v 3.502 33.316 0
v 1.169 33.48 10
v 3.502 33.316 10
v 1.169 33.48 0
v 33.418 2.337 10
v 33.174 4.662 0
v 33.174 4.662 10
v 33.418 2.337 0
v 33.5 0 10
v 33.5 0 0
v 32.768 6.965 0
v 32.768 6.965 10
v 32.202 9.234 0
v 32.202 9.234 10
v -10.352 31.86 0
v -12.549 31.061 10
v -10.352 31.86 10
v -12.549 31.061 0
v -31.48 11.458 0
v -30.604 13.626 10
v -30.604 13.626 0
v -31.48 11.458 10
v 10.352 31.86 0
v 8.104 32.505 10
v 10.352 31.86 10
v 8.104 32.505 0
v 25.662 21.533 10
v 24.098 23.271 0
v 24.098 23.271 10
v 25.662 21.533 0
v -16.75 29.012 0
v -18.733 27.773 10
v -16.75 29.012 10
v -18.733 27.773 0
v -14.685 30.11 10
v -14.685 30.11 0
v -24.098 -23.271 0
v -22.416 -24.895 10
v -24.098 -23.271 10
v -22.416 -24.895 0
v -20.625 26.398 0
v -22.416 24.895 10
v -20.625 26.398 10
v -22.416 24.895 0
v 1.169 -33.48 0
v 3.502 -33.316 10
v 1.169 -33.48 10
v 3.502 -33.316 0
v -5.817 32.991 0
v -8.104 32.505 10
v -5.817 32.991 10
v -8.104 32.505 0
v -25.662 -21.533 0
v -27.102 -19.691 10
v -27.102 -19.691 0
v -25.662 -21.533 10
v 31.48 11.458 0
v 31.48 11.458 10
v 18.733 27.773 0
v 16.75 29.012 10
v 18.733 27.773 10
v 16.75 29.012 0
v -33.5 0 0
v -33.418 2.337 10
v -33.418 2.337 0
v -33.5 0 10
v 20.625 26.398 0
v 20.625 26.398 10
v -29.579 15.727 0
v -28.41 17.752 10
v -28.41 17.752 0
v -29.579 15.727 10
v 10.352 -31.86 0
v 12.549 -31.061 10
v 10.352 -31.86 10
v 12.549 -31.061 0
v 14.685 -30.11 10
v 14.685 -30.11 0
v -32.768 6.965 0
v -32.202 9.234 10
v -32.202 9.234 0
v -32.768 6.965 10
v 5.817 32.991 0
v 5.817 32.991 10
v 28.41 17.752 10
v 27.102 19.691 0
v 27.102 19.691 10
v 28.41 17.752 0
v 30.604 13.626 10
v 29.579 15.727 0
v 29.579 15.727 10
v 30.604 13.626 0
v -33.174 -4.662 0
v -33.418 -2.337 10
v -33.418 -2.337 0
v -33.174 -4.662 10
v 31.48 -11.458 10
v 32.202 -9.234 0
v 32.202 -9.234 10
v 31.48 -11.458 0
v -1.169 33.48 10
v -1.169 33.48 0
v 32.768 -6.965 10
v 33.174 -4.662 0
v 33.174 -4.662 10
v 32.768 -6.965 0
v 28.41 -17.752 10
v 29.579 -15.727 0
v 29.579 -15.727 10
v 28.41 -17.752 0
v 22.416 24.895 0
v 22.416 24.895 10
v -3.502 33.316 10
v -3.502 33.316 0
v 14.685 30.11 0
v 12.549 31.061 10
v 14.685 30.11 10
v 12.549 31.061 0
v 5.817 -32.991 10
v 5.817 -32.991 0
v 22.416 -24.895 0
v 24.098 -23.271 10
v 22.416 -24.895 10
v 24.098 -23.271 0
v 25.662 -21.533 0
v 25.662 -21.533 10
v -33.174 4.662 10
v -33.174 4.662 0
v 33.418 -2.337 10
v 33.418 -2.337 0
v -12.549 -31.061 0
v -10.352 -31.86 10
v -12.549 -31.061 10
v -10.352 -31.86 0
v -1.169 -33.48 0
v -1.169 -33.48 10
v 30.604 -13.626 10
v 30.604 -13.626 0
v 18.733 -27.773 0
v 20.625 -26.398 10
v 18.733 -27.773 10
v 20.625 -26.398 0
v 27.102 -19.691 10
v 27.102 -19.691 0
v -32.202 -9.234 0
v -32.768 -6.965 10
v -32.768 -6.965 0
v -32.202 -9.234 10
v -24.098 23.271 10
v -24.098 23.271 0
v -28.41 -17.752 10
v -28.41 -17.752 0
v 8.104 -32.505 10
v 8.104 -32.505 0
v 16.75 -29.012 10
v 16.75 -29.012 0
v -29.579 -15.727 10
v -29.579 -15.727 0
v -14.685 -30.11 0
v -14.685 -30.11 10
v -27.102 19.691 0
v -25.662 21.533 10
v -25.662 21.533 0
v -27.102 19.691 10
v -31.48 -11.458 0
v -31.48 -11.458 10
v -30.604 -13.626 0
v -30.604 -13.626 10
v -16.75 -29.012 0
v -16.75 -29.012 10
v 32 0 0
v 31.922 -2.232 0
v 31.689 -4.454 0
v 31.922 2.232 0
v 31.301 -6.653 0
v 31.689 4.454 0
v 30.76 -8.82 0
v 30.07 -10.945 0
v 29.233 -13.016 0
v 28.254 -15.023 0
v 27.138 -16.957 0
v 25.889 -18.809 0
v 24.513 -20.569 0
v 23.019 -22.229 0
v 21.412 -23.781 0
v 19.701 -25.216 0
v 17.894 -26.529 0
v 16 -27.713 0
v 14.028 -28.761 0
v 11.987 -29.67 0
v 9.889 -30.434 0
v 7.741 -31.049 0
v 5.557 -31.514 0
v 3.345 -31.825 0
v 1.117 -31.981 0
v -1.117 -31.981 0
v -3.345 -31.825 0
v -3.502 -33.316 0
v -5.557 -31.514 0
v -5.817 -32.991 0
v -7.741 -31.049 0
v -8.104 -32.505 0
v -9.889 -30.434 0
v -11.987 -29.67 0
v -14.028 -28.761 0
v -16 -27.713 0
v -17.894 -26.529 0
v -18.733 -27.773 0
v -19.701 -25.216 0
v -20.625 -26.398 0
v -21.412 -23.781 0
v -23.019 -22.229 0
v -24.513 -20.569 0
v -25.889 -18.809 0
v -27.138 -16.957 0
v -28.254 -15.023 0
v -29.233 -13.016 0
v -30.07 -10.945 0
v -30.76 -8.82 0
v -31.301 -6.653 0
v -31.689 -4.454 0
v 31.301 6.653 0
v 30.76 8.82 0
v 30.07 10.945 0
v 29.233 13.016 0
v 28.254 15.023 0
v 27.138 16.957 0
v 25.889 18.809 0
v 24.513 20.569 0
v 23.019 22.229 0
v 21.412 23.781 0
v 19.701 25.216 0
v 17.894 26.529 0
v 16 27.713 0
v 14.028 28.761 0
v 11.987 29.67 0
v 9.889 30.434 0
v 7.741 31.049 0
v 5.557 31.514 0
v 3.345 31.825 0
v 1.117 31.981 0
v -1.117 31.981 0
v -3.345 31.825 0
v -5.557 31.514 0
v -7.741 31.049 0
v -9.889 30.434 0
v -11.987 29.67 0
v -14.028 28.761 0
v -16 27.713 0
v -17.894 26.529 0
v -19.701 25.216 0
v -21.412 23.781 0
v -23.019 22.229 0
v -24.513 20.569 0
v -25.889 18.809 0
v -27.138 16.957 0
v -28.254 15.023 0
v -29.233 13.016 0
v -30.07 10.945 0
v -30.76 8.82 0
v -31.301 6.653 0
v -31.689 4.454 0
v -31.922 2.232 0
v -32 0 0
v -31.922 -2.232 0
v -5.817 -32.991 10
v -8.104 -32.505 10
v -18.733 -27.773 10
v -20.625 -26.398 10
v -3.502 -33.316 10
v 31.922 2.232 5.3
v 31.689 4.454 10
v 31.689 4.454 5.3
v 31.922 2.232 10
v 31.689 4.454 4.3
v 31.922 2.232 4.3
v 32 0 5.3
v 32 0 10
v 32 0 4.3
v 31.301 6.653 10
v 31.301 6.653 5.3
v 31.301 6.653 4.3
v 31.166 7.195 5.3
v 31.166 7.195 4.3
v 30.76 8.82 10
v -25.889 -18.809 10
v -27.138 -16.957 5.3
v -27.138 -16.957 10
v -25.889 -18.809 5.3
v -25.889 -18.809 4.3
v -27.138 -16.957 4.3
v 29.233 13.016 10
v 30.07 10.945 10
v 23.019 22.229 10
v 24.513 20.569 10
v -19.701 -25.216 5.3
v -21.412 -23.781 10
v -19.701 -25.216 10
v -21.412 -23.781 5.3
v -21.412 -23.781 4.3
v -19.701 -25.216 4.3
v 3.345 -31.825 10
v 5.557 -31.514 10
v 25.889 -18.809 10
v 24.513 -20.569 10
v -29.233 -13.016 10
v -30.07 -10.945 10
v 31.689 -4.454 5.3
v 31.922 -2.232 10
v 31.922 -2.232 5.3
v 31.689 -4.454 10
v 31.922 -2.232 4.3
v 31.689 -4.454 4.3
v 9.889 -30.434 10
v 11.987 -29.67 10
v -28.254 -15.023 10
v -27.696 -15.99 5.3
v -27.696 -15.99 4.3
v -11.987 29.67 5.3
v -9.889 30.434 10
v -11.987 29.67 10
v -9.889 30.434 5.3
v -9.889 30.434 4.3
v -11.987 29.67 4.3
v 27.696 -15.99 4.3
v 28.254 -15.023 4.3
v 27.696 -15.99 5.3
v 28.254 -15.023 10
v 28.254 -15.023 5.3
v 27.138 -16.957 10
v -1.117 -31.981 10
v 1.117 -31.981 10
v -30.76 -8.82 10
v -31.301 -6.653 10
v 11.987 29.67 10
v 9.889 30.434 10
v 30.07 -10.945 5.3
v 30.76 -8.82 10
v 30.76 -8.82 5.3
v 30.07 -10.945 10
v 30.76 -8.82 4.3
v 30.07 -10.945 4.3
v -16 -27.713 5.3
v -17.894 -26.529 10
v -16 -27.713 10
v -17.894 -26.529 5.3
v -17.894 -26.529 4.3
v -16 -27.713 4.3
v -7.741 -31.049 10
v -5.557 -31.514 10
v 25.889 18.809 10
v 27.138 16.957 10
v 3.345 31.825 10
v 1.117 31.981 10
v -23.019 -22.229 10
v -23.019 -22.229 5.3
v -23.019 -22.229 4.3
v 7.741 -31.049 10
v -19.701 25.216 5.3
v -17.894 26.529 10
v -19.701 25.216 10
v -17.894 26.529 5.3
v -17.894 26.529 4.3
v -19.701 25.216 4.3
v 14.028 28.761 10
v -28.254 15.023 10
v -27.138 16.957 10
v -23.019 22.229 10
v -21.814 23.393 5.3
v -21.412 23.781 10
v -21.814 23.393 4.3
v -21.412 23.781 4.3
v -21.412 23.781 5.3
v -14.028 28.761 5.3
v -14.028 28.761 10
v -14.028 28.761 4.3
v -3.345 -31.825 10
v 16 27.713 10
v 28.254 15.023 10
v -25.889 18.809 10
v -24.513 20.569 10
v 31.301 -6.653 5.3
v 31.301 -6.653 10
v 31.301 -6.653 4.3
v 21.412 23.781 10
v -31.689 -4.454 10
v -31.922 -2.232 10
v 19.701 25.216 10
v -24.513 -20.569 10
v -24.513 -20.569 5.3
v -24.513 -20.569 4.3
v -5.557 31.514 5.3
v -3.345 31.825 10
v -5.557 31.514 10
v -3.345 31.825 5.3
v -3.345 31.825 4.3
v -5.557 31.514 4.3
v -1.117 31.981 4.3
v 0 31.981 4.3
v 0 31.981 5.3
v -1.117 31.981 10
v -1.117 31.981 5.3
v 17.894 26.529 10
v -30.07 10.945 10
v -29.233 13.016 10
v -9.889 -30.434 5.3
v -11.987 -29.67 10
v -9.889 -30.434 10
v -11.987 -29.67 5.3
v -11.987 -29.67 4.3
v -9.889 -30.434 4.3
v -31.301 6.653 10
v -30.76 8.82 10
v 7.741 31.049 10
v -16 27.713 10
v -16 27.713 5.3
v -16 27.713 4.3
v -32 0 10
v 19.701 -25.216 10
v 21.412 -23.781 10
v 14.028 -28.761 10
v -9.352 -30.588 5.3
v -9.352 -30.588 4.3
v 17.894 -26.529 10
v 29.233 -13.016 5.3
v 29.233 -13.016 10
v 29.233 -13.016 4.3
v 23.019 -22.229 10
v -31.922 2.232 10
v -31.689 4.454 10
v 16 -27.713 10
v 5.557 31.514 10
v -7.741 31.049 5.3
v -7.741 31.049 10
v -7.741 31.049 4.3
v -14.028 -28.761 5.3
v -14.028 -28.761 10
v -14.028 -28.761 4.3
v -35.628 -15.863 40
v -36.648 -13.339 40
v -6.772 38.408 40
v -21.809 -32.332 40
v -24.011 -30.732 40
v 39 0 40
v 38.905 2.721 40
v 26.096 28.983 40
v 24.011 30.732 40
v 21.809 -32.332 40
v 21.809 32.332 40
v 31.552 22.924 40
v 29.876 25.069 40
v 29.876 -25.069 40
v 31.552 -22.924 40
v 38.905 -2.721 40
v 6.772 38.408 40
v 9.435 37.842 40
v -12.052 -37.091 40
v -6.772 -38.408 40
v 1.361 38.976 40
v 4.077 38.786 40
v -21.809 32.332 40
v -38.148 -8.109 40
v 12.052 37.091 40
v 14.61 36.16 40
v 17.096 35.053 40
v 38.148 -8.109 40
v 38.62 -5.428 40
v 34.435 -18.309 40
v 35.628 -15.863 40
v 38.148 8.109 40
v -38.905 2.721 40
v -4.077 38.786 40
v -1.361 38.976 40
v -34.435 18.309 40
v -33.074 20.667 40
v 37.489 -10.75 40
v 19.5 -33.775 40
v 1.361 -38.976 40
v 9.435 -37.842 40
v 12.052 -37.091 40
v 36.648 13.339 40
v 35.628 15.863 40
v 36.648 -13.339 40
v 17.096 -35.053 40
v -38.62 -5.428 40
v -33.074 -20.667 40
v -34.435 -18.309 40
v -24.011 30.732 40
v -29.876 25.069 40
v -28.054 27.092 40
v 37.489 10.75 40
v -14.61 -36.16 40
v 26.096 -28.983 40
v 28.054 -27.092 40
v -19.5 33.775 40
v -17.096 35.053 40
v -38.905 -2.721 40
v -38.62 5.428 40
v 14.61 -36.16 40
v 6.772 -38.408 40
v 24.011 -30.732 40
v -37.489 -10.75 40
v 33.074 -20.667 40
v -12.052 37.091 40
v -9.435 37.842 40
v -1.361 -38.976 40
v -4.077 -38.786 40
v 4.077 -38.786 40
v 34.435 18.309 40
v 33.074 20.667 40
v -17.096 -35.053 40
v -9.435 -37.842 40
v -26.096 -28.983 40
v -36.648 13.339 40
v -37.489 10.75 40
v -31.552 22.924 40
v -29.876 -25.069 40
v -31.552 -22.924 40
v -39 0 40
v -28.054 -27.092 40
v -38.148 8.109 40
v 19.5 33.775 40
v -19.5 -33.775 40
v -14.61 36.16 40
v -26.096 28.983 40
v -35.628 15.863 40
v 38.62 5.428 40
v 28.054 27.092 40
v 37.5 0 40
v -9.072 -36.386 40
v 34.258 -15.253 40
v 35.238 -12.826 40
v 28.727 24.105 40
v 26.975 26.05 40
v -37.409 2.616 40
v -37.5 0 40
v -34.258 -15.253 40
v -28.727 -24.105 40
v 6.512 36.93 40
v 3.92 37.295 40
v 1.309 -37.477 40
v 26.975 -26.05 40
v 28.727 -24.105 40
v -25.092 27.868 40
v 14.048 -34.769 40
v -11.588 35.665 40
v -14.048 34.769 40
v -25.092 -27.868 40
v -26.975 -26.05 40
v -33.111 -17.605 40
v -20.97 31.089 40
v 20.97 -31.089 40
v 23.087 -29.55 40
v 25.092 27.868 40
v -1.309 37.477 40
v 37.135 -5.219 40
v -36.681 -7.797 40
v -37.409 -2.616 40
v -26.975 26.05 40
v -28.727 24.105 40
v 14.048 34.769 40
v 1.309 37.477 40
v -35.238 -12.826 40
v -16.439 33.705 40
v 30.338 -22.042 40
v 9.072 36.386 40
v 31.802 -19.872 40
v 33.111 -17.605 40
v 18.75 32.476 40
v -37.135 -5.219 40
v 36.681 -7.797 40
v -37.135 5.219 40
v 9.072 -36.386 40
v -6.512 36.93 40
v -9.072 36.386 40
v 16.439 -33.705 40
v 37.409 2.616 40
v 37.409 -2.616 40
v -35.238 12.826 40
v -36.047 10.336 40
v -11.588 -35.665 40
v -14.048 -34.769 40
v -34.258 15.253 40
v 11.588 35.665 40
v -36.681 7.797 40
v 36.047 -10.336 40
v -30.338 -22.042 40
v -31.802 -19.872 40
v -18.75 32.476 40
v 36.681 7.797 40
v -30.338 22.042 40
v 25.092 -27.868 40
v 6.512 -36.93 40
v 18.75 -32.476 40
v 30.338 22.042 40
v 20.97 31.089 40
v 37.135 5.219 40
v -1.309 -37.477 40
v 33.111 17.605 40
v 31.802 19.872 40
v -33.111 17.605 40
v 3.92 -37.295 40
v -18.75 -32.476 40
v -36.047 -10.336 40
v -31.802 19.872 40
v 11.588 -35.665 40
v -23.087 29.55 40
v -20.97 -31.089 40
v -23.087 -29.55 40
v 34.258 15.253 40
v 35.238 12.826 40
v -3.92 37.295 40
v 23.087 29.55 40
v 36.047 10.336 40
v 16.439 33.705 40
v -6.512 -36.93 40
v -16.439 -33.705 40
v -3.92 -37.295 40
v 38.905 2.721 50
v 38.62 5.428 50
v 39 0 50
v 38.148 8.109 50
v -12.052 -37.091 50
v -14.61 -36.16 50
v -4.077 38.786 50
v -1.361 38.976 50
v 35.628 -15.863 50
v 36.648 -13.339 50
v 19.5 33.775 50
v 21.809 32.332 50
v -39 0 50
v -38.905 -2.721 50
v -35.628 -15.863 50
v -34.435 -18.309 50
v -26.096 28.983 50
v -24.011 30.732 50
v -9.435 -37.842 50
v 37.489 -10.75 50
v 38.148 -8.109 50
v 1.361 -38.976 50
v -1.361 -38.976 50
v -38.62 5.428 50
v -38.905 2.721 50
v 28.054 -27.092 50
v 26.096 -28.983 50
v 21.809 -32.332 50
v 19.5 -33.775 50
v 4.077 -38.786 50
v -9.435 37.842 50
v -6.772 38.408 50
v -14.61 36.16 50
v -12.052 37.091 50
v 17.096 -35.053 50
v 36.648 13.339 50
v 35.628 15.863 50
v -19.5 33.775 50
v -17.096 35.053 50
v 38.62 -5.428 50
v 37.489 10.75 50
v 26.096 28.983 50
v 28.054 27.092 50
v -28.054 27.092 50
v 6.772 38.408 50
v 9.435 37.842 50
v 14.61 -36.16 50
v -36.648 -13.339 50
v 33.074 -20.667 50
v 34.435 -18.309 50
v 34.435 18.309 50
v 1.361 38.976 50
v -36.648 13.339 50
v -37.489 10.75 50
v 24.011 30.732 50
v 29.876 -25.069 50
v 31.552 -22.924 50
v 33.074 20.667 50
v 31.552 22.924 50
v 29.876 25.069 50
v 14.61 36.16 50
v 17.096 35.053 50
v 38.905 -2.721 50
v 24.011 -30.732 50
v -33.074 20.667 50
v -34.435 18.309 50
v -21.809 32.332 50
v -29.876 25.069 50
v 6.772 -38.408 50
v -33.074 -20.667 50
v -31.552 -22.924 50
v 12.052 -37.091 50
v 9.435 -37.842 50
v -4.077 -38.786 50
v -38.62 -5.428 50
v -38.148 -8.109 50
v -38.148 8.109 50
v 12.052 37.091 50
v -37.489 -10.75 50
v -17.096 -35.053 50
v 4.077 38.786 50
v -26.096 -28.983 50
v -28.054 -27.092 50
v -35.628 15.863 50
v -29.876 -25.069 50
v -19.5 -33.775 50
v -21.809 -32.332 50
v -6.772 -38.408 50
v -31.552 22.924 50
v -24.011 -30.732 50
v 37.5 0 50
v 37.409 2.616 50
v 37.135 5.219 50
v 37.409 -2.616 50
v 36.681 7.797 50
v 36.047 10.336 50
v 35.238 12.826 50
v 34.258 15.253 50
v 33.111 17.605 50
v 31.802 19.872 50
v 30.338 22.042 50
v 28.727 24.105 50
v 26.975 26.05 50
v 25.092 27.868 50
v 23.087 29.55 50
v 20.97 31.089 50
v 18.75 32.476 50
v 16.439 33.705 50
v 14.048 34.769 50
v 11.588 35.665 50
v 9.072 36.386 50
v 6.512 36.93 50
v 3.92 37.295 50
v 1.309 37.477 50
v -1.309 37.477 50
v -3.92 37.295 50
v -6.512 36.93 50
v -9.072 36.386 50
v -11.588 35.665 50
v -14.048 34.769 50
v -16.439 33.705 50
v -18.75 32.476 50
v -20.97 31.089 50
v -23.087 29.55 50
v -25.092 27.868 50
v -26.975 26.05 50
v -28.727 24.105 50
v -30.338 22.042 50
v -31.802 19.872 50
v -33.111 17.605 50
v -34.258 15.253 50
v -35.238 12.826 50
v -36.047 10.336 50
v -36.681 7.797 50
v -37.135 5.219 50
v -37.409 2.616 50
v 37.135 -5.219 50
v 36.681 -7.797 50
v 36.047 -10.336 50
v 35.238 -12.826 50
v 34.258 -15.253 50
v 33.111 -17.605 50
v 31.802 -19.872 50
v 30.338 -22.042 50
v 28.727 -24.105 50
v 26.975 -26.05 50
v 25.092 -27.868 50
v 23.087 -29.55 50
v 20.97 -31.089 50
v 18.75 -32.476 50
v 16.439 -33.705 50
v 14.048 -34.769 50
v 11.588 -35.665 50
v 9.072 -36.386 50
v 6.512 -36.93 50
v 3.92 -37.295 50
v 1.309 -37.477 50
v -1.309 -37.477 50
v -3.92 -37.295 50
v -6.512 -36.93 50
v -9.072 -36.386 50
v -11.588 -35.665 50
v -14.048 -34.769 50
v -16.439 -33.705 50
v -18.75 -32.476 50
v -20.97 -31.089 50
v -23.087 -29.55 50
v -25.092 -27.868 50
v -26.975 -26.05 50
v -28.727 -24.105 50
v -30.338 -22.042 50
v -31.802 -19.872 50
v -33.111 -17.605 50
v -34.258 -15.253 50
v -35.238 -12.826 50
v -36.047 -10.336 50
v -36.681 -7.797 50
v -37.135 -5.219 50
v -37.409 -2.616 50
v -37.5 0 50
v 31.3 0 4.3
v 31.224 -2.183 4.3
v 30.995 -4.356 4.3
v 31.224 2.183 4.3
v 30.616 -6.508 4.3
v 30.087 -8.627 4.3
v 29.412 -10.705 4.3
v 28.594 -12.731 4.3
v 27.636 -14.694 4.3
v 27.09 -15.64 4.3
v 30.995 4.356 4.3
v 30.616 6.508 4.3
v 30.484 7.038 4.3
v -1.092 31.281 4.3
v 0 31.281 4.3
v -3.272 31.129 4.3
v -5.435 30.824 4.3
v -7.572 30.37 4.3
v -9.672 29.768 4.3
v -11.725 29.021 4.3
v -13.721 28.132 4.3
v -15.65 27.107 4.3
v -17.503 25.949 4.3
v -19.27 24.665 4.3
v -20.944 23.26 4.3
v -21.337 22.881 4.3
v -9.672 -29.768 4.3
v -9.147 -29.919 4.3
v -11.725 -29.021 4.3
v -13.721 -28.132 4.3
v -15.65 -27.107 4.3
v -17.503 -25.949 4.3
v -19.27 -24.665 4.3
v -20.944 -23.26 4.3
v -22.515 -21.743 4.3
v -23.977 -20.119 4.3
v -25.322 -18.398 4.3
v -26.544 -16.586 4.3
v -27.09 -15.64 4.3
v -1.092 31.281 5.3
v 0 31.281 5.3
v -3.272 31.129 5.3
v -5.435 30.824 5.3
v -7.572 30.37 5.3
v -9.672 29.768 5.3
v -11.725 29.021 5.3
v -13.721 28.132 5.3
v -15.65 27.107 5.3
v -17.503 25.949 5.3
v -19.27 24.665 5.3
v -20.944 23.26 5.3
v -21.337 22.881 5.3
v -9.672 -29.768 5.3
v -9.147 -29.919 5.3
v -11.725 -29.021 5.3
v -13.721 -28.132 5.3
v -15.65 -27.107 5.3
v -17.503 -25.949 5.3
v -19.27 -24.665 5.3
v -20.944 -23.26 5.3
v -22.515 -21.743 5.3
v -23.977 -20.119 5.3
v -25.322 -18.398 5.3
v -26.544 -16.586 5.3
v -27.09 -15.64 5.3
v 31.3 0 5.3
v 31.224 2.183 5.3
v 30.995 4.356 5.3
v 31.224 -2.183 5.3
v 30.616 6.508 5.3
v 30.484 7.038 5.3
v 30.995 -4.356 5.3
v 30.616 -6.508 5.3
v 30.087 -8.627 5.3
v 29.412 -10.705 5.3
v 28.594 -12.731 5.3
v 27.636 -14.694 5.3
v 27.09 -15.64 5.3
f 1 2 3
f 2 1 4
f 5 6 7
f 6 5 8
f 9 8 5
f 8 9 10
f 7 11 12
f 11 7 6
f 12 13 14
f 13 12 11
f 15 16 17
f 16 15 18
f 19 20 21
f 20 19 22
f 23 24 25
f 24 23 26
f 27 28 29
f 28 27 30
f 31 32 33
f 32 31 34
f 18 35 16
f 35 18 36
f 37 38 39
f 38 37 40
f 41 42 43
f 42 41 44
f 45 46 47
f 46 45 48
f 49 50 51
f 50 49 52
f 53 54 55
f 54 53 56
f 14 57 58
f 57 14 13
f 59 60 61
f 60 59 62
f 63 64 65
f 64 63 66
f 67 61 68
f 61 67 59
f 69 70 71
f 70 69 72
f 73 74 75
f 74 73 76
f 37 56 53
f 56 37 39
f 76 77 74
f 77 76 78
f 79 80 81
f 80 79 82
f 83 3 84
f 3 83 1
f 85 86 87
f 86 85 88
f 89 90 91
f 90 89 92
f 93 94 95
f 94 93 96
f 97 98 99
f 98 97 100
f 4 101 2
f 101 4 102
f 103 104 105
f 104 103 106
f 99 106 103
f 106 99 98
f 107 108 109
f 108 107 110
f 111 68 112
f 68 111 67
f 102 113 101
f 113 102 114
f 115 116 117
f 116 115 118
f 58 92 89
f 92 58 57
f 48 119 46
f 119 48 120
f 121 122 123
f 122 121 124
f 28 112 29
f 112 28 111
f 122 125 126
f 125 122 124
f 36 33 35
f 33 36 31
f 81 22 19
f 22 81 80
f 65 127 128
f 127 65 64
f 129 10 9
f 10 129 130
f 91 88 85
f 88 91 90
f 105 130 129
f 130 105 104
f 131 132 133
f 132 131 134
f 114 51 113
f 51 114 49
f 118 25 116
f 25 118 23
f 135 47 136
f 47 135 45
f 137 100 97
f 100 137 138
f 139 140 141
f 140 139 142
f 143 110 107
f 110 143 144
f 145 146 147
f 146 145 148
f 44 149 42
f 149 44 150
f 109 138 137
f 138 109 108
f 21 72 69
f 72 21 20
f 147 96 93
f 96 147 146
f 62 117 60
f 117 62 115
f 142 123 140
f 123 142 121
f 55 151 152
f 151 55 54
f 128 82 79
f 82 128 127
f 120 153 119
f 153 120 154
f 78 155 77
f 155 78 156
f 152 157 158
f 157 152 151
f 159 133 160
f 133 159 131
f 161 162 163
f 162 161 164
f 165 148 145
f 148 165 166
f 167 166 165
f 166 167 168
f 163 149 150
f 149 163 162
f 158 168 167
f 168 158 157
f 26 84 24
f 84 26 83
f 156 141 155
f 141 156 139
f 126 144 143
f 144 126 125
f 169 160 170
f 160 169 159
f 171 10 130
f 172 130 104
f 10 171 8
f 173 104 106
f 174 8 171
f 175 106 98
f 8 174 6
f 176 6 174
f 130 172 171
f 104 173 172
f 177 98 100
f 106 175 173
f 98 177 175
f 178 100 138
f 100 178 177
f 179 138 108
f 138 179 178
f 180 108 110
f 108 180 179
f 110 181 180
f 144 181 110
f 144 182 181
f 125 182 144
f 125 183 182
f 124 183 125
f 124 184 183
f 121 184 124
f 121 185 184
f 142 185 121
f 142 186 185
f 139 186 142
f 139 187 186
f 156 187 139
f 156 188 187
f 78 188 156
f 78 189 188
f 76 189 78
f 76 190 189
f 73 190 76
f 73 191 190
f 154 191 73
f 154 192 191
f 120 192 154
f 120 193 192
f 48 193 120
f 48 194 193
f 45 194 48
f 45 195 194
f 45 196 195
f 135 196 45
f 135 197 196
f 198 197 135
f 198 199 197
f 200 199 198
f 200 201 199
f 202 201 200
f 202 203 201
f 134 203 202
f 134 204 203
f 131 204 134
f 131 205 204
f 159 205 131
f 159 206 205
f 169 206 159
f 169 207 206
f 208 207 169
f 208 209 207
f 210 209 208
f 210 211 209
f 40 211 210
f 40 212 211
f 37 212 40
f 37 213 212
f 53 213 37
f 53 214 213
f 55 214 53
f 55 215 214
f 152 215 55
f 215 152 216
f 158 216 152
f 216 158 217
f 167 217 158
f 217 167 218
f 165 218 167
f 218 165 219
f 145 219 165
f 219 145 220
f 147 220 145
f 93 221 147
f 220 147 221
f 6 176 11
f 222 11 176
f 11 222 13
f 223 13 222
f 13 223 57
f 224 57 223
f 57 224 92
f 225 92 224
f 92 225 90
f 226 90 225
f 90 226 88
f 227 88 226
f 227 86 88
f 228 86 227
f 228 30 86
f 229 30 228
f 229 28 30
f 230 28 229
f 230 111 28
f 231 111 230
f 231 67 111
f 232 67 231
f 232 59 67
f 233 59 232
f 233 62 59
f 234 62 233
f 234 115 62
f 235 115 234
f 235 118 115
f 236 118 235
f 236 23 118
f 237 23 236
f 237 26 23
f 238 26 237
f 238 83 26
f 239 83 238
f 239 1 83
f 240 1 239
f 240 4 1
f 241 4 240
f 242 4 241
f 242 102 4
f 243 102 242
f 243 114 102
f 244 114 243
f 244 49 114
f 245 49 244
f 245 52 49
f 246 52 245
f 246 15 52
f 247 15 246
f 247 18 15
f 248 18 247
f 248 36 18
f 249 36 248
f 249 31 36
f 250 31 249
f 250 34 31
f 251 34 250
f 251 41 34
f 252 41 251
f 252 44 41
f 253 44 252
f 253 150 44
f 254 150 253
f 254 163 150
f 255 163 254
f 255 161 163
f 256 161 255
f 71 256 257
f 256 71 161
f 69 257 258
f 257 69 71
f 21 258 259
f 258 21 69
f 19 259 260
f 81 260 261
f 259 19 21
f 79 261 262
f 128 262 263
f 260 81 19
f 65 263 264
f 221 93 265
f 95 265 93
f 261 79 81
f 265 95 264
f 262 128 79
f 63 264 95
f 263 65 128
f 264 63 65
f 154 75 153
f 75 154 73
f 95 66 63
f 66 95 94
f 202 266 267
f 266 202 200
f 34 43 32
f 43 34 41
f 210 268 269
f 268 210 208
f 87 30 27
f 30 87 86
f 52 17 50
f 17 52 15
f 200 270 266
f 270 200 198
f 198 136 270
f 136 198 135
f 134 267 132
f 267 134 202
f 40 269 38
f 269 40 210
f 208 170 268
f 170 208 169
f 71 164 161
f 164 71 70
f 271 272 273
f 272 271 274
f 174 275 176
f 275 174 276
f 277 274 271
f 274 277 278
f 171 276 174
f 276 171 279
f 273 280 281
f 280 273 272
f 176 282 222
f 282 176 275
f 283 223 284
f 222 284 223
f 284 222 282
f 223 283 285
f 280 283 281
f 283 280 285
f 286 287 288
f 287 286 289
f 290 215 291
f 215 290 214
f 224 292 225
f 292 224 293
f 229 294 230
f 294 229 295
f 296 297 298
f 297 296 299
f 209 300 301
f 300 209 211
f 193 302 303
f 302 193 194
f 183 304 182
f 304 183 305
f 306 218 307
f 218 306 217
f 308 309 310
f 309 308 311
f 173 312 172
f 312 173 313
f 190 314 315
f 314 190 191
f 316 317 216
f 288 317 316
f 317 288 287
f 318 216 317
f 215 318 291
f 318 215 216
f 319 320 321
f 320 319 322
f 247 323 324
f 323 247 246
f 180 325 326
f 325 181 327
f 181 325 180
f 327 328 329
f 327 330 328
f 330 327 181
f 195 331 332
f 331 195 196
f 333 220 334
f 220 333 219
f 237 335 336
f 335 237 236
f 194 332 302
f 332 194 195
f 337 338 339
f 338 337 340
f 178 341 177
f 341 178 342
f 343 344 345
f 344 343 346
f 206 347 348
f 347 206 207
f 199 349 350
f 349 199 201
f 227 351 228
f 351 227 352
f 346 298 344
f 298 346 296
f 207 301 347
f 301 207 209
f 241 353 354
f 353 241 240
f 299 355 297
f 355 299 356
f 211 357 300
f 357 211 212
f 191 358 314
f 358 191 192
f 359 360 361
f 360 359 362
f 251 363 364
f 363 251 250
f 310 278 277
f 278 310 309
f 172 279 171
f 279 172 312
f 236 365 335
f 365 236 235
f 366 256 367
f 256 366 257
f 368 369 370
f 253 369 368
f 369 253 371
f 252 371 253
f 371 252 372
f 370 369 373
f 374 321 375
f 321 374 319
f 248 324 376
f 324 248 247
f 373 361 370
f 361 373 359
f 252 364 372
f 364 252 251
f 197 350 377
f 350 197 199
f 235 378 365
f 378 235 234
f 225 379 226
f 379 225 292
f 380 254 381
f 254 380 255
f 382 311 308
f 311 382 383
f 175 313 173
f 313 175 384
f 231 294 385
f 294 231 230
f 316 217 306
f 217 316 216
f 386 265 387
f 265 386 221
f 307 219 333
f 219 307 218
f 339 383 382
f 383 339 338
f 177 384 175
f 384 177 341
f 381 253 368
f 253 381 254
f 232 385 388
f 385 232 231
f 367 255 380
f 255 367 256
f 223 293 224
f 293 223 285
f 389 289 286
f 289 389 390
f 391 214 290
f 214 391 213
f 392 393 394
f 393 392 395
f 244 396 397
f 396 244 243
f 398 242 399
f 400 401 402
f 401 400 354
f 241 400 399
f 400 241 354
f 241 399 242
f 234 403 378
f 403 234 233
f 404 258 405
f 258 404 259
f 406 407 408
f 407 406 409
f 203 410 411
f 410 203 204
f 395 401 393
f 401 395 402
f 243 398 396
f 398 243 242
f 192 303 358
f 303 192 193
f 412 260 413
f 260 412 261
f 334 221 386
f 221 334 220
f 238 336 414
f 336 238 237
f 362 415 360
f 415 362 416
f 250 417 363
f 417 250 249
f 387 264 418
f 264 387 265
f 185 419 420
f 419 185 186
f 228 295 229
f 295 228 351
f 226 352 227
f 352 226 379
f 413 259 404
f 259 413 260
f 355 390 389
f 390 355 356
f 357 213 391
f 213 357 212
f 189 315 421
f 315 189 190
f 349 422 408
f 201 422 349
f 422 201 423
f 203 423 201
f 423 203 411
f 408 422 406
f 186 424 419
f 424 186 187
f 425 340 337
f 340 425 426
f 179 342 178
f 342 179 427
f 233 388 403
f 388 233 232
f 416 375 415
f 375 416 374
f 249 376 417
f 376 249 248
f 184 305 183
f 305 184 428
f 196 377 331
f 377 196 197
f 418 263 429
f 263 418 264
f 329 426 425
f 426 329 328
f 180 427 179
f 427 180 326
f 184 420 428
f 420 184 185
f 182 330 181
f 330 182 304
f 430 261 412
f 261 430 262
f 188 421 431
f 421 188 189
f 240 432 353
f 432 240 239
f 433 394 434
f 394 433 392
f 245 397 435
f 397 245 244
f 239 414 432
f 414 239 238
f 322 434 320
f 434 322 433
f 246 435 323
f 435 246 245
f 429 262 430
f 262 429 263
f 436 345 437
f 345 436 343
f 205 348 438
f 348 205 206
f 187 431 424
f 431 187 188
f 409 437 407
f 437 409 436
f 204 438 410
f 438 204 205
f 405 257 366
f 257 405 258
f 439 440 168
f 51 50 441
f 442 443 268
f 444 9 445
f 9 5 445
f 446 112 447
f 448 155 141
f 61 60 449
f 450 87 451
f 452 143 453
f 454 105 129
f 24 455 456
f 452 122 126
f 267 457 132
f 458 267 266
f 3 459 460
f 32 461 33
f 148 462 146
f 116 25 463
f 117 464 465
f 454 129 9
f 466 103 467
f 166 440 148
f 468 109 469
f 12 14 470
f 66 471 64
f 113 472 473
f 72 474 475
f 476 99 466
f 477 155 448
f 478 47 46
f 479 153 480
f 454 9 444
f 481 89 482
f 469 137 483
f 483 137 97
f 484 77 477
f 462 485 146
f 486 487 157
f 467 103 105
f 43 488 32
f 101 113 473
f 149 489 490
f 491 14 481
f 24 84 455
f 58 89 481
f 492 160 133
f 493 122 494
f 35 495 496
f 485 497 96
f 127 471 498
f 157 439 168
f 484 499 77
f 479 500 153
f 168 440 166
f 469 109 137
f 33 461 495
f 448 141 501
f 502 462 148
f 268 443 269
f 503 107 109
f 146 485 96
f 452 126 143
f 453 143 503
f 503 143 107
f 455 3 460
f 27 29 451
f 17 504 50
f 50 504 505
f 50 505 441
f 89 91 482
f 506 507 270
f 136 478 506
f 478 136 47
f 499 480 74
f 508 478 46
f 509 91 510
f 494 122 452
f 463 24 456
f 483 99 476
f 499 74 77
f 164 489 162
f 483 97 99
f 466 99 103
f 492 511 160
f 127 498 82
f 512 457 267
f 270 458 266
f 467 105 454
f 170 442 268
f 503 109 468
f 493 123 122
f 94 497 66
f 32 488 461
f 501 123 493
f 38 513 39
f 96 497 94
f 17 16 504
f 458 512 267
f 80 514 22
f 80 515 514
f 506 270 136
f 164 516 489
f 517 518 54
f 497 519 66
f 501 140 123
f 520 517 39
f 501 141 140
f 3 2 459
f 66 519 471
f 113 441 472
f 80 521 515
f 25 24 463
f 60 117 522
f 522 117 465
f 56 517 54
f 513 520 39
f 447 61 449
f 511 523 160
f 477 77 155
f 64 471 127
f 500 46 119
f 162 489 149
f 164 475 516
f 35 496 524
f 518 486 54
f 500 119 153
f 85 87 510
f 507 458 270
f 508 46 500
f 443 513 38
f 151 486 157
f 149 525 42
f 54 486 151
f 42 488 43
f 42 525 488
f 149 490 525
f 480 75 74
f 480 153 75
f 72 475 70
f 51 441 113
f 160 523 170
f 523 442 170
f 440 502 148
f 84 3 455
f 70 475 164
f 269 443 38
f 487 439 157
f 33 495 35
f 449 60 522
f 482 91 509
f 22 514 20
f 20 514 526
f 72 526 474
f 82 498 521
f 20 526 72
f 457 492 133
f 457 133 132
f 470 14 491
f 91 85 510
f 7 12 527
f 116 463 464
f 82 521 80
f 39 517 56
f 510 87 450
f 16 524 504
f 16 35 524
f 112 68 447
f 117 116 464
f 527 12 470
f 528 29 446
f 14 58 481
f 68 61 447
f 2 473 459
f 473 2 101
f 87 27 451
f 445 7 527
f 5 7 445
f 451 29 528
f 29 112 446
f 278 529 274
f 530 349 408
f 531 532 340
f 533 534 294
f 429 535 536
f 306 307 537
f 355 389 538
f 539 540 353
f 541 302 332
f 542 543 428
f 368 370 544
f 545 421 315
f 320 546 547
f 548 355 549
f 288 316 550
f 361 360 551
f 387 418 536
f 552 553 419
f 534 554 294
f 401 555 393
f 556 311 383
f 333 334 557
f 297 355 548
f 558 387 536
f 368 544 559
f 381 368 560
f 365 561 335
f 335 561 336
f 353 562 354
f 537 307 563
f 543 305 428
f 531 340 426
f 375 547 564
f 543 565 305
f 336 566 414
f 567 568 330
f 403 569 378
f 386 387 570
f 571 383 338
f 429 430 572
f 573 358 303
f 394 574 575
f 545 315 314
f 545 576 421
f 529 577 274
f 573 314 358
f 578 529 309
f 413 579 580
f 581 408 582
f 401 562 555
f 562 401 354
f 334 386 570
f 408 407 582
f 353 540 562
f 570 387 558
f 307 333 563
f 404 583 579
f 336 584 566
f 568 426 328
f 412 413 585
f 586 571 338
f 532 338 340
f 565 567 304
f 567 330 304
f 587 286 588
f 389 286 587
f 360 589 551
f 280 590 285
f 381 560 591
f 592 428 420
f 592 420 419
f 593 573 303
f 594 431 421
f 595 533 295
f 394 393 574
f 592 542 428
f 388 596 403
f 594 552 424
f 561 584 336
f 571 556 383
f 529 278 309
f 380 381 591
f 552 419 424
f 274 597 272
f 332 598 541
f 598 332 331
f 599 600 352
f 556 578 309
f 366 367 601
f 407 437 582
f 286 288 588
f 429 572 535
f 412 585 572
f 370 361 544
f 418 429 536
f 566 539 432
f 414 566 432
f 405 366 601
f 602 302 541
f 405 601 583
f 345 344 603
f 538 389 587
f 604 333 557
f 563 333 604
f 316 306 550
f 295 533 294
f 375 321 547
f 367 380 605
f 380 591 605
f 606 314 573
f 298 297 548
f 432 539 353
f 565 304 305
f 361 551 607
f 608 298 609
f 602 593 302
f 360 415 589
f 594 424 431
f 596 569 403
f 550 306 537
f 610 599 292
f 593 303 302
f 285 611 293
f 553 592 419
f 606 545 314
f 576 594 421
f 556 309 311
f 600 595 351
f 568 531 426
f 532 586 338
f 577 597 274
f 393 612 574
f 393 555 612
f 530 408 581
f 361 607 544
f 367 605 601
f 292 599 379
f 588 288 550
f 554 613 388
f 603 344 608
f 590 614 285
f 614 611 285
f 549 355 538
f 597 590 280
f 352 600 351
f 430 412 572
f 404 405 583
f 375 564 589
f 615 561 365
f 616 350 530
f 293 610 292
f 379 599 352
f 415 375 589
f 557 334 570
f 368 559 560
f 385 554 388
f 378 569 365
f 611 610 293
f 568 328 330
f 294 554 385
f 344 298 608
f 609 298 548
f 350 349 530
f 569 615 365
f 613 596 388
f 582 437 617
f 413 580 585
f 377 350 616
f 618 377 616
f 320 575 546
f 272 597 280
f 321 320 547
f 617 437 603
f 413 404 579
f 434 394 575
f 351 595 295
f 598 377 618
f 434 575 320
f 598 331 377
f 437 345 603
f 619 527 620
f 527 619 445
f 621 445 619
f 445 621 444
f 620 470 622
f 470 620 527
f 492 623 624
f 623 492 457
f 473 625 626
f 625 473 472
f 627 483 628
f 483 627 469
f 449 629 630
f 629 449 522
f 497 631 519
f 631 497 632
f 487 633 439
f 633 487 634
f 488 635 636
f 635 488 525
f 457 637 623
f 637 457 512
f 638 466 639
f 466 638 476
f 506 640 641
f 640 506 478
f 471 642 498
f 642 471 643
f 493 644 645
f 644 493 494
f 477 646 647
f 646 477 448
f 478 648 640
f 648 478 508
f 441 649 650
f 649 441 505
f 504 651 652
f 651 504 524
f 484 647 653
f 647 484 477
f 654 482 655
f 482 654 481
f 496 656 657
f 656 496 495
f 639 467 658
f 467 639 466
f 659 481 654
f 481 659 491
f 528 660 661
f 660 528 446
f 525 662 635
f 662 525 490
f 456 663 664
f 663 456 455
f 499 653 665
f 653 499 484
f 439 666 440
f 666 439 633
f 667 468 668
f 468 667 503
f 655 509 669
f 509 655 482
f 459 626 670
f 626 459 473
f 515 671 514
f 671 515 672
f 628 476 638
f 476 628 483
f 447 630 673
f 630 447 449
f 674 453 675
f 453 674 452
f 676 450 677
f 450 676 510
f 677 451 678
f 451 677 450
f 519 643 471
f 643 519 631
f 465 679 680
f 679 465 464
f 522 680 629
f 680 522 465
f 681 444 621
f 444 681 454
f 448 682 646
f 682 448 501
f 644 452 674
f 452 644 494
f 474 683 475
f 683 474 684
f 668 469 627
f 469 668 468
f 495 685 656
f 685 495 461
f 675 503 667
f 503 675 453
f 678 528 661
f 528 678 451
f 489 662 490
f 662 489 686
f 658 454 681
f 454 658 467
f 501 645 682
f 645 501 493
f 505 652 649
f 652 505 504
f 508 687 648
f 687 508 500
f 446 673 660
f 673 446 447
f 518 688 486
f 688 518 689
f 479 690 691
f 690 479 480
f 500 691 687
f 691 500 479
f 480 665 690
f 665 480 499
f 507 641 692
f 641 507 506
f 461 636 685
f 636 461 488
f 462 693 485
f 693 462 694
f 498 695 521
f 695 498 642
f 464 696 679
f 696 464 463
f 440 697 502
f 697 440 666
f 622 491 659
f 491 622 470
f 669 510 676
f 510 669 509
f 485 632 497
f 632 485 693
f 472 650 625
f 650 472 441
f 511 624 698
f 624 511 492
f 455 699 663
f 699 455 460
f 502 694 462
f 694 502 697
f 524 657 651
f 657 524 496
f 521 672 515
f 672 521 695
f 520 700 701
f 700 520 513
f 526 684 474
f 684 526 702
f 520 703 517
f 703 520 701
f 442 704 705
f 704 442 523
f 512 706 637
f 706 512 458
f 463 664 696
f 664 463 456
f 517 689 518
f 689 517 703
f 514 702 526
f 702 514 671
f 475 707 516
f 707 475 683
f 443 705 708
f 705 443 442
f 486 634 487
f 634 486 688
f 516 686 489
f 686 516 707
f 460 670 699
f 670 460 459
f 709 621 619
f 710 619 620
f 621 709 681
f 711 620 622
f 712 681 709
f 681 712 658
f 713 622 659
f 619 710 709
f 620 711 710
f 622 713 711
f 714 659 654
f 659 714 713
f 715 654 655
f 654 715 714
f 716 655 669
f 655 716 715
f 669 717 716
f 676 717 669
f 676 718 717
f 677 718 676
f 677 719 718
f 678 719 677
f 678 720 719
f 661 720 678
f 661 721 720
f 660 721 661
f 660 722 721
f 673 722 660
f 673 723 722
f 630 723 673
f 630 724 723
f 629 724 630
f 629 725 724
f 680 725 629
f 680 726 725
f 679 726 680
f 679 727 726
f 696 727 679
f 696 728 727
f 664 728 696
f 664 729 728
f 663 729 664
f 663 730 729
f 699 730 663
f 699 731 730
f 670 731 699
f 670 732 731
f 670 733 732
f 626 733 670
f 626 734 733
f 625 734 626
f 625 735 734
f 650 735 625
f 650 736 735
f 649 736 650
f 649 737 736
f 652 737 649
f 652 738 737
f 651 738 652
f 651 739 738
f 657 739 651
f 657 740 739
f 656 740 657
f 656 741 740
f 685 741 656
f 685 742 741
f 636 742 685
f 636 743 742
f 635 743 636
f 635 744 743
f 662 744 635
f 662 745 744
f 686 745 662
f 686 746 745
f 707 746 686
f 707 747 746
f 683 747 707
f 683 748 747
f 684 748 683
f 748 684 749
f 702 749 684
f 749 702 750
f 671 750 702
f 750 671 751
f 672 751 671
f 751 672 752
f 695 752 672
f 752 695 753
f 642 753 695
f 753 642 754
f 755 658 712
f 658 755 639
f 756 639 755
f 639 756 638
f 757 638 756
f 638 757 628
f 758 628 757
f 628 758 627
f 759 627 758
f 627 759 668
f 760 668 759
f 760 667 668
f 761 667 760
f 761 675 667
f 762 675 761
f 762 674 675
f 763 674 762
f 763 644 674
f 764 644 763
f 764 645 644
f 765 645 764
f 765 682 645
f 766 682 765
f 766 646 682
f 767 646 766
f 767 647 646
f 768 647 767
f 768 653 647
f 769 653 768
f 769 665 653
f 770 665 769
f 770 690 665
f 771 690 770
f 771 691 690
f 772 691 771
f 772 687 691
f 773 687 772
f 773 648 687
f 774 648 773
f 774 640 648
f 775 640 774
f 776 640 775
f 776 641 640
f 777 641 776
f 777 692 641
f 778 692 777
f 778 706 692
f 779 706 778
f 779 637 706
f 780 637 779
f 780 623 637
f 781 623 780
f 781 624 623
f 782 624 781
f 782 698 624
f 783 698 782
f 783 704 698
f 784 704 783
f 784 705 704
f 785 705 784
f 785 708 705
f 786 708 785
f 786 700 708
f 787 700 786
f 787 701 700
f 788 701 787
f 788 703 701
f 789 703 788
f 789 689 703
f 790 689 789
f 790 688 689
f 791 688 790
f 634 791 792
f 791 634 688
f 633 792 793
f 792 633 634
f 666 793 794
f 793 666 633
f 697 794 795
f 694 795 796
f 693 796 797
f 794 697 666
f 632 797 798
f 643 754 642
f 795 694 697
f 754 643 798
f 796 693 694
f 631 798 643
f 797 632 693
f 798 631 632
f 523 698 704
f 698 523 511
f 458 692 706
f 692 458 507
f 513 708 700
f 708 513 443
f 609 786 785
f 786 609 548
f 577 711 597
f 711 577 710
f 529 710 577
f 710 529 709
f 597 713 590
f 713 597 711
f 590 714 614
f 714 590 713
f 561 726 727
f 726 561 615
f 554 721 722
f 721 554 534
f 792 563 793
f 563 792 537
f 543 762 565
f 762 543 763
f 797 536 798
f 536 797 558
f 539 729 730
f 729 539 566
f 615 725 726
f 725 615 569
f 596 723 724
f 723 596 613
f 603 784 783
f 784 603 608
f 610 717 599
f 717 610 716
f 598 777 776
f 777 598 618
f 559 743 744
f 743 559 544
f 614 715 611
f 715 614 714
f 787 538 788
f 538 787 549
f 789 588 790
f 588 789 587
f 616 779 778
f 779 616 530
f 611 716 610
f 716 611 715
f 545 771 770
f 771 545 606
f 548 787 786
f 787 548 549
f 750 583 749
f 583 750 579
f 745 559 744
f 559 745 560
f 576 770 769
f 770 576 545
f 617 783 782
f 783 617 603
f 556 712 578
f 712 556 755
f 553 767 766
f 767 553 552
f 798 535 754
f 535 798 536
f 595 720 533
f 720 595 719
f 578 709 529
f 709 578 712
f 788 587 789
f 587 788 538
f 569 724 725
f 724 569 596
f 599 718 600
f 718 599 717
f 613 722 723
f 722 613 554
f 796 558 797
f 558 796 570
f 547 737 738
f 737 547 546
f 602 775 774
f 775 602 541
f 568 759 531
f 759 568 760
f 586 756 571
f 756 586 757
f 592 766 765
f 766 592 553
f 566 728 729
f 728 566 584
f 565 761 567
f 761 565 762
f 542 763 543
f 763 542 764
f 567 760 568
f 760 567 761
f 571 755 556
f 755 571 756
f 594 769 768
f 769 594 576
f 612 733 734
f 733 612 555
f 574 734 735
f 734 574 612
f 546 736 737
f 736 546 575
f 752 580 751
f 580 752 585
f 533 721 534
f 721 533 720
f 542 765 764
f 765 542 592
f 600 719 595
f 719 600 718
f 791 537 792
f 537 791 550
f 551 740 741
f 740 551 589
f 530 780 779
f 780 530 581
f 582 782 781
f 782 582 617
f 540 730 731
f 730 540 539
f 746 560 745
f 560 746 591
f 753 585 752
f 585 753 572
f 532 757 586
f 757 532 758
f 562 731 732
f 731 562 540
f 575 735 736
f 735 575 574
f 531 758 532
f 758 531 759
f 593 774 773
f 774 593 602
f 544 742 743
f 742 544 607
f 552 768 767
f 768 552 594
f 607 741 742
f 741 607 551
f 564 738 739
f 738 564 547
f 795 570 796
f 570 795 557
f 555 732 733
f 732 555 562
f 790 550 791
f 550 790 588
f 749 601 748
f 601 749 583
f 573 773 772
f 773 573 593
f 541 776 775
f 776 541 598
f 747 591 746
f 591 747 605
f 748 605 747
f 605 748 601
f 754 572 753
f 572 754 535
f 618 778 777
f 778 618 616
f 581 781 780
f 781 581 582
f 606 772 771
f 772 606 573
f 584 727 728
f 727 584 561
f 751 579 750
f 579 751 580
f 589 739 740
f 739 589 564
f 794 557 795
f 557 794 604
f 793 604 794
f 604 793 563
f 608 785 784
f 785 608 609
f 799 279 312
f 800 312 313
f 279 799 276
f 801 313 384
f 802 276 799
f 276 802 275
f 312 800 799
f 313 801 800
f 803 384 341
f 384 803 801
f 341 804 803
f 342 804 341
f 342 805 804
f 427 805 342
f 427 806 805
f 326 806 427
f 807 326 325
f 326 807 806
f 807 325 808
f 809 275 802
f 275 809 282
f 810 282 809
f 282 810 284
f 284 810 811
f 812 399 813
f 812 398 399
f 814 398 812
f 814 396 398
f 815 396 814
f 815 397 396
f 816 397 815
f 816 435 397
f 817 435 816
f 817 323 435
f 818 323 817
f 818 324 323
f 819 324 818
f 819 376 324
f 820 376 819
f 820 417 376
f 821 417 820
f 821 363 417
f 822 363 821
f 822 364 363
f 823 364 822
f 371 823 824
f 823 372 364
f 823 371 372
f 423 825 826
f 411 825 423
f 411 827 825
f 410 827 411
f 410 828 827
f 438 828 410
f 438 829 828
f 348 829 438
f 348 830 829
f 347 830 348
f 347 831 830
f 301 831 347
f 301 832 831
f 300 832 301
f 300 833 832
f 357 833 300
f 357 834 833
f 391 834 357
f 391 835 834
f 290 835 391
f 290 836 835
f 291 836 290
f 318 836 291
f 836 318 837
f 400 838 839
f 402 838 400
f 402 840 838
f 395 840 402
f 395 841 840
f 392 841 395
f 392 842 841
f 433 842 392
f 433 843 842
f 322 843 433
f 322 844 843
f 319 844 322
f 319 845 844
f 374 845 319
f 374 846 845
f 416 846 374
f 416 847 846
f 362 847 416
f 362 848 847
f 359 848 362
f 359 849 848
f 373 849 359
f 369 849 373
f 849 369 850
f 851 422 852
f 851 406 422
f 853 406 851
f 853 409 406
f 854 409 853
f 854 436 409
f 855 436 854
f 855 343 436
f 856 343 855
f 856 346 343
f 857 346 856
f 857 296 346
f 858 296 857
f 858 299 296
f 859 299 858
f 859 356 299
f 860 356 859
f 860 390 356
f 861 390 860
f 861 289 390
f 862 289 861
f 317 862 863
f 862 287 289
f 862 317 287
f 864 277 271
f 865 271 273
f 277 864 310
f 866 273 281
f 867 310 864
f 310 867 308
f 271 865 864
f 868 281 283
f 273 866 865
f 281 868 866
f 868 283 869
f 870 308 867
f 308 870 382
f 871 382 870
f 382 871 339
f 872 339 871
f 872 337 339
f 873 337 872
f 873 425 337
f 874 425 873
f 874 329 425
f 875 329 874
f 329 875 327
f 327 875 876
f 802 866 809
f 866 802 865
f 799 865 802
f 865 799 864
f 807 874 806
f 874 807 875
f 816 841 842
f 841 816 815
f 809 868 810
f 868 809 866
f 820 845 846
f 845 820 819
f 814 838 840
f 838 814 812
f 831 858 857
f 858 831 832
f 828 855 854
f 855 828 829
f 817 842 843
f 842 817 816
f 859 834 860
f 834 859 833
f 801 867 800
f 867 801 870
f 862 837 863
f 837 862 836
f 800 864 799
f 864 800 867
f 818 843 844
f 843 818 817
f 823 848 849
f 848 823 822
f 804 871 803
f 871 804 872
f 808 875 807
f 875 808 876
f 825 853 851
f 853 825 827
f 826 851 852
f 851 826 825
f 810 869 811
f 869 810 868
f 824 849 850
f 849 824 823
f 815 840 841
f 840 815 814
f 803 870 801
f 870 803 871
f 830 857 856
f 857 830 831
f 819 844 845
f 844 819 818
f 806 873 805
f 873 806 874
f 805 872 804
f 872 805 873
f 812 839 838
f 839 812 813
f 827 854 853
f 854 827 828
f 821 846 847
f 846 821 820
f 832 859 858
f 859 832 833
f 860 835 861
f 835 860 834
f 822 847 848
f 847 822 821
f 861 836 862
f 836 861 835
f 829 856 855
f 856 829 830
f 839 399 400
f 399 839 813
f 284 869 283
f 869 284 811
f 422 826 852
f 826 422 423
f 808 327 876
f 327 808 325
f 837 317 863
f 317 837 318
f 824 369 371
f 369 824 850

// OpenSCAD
//Parameterised olympus bayonet lens hood generator
// Glyn Cowles Feb 2014


//Thickness of tube walls 
thickness=1.5; 
//Inside diameter of bottom tube 
d1_inside=64;   
//Height of bottom tube 
h1=10;   
//Inside diameter of top tube
d2_inside=75;   
//Height of top tube
h2=10;   
//Height of connector section
c_ht=30; 
// Percentage of circumference for one flange
f_pcent=12;
// Flange thickness
f_th=.7;
//Flange height
f_ht=1;
// Resolution
$fn=90;

d1=d1_inside+2*thickness;
d2=d2_inside+2*thickness;
mask_degree=ceil(120-(f_pcent/100*360)); // this is the angle of the pie_slice mask
assemble(); 
//-----------------------------------------------------------------------
module tube(d,h,t) { // diameter height thickness
rad=d/2;
difference() {
cylinder(h=h,r=rad);
cylinder(h=h,r=rad-t);
}
}
//-----------------------------------------------------------------------

module connector(){
difference() {
 cylinder (h=c_ht,r1=d1/2,r2=d2/2);
 cylinder (h=c_ht,r1=d1/2-thickness,r2=d2/2-thickness);
}
}
//-----------------------------------------------------------------------

module flange() { // the three connecting lugs at the base
  difference() {
  tube(d1-thickness*2,f_ht,f_th);
  union () { 	
  		pie_slice(0,mask_degree,d1,f_ht)  ; //65 deg is the amount to remove
  		pie_slice(120,mask_degree,d1,f_ht)  ;
  		pie_slice(240,mask_degree,d1,f_ht)  ;
	}
  }
}
//-----------------------------------------------------------------------

module pie_slice(a,b,rad,h) { // make a pie slice starting at angle a continuing for angle b with radius of rad and height of h
	x1=sin(a)*rad;
	y1=cos(a)*rad;
	x2=sin(a+b)*rad;
	y2=cos(a+b)*rad;
	linear_extrude(height=h) 
	polygon(
		points=[ [0,0],[x1,y1],[x2,y2]]
	); 
}
//-----------------------------------------------------------------------

module assemble() {
union() {
	tube(d1,h1,thickness); //bottom tube
	translate([0,0,h1]) connector();  // connector
	translate([0,0,h1+c_ht])  tube(d2,h2,thickness); // top tube
	translate([0,0,h1/2-f_th]) flange(); //connecting lugs
	}
};



